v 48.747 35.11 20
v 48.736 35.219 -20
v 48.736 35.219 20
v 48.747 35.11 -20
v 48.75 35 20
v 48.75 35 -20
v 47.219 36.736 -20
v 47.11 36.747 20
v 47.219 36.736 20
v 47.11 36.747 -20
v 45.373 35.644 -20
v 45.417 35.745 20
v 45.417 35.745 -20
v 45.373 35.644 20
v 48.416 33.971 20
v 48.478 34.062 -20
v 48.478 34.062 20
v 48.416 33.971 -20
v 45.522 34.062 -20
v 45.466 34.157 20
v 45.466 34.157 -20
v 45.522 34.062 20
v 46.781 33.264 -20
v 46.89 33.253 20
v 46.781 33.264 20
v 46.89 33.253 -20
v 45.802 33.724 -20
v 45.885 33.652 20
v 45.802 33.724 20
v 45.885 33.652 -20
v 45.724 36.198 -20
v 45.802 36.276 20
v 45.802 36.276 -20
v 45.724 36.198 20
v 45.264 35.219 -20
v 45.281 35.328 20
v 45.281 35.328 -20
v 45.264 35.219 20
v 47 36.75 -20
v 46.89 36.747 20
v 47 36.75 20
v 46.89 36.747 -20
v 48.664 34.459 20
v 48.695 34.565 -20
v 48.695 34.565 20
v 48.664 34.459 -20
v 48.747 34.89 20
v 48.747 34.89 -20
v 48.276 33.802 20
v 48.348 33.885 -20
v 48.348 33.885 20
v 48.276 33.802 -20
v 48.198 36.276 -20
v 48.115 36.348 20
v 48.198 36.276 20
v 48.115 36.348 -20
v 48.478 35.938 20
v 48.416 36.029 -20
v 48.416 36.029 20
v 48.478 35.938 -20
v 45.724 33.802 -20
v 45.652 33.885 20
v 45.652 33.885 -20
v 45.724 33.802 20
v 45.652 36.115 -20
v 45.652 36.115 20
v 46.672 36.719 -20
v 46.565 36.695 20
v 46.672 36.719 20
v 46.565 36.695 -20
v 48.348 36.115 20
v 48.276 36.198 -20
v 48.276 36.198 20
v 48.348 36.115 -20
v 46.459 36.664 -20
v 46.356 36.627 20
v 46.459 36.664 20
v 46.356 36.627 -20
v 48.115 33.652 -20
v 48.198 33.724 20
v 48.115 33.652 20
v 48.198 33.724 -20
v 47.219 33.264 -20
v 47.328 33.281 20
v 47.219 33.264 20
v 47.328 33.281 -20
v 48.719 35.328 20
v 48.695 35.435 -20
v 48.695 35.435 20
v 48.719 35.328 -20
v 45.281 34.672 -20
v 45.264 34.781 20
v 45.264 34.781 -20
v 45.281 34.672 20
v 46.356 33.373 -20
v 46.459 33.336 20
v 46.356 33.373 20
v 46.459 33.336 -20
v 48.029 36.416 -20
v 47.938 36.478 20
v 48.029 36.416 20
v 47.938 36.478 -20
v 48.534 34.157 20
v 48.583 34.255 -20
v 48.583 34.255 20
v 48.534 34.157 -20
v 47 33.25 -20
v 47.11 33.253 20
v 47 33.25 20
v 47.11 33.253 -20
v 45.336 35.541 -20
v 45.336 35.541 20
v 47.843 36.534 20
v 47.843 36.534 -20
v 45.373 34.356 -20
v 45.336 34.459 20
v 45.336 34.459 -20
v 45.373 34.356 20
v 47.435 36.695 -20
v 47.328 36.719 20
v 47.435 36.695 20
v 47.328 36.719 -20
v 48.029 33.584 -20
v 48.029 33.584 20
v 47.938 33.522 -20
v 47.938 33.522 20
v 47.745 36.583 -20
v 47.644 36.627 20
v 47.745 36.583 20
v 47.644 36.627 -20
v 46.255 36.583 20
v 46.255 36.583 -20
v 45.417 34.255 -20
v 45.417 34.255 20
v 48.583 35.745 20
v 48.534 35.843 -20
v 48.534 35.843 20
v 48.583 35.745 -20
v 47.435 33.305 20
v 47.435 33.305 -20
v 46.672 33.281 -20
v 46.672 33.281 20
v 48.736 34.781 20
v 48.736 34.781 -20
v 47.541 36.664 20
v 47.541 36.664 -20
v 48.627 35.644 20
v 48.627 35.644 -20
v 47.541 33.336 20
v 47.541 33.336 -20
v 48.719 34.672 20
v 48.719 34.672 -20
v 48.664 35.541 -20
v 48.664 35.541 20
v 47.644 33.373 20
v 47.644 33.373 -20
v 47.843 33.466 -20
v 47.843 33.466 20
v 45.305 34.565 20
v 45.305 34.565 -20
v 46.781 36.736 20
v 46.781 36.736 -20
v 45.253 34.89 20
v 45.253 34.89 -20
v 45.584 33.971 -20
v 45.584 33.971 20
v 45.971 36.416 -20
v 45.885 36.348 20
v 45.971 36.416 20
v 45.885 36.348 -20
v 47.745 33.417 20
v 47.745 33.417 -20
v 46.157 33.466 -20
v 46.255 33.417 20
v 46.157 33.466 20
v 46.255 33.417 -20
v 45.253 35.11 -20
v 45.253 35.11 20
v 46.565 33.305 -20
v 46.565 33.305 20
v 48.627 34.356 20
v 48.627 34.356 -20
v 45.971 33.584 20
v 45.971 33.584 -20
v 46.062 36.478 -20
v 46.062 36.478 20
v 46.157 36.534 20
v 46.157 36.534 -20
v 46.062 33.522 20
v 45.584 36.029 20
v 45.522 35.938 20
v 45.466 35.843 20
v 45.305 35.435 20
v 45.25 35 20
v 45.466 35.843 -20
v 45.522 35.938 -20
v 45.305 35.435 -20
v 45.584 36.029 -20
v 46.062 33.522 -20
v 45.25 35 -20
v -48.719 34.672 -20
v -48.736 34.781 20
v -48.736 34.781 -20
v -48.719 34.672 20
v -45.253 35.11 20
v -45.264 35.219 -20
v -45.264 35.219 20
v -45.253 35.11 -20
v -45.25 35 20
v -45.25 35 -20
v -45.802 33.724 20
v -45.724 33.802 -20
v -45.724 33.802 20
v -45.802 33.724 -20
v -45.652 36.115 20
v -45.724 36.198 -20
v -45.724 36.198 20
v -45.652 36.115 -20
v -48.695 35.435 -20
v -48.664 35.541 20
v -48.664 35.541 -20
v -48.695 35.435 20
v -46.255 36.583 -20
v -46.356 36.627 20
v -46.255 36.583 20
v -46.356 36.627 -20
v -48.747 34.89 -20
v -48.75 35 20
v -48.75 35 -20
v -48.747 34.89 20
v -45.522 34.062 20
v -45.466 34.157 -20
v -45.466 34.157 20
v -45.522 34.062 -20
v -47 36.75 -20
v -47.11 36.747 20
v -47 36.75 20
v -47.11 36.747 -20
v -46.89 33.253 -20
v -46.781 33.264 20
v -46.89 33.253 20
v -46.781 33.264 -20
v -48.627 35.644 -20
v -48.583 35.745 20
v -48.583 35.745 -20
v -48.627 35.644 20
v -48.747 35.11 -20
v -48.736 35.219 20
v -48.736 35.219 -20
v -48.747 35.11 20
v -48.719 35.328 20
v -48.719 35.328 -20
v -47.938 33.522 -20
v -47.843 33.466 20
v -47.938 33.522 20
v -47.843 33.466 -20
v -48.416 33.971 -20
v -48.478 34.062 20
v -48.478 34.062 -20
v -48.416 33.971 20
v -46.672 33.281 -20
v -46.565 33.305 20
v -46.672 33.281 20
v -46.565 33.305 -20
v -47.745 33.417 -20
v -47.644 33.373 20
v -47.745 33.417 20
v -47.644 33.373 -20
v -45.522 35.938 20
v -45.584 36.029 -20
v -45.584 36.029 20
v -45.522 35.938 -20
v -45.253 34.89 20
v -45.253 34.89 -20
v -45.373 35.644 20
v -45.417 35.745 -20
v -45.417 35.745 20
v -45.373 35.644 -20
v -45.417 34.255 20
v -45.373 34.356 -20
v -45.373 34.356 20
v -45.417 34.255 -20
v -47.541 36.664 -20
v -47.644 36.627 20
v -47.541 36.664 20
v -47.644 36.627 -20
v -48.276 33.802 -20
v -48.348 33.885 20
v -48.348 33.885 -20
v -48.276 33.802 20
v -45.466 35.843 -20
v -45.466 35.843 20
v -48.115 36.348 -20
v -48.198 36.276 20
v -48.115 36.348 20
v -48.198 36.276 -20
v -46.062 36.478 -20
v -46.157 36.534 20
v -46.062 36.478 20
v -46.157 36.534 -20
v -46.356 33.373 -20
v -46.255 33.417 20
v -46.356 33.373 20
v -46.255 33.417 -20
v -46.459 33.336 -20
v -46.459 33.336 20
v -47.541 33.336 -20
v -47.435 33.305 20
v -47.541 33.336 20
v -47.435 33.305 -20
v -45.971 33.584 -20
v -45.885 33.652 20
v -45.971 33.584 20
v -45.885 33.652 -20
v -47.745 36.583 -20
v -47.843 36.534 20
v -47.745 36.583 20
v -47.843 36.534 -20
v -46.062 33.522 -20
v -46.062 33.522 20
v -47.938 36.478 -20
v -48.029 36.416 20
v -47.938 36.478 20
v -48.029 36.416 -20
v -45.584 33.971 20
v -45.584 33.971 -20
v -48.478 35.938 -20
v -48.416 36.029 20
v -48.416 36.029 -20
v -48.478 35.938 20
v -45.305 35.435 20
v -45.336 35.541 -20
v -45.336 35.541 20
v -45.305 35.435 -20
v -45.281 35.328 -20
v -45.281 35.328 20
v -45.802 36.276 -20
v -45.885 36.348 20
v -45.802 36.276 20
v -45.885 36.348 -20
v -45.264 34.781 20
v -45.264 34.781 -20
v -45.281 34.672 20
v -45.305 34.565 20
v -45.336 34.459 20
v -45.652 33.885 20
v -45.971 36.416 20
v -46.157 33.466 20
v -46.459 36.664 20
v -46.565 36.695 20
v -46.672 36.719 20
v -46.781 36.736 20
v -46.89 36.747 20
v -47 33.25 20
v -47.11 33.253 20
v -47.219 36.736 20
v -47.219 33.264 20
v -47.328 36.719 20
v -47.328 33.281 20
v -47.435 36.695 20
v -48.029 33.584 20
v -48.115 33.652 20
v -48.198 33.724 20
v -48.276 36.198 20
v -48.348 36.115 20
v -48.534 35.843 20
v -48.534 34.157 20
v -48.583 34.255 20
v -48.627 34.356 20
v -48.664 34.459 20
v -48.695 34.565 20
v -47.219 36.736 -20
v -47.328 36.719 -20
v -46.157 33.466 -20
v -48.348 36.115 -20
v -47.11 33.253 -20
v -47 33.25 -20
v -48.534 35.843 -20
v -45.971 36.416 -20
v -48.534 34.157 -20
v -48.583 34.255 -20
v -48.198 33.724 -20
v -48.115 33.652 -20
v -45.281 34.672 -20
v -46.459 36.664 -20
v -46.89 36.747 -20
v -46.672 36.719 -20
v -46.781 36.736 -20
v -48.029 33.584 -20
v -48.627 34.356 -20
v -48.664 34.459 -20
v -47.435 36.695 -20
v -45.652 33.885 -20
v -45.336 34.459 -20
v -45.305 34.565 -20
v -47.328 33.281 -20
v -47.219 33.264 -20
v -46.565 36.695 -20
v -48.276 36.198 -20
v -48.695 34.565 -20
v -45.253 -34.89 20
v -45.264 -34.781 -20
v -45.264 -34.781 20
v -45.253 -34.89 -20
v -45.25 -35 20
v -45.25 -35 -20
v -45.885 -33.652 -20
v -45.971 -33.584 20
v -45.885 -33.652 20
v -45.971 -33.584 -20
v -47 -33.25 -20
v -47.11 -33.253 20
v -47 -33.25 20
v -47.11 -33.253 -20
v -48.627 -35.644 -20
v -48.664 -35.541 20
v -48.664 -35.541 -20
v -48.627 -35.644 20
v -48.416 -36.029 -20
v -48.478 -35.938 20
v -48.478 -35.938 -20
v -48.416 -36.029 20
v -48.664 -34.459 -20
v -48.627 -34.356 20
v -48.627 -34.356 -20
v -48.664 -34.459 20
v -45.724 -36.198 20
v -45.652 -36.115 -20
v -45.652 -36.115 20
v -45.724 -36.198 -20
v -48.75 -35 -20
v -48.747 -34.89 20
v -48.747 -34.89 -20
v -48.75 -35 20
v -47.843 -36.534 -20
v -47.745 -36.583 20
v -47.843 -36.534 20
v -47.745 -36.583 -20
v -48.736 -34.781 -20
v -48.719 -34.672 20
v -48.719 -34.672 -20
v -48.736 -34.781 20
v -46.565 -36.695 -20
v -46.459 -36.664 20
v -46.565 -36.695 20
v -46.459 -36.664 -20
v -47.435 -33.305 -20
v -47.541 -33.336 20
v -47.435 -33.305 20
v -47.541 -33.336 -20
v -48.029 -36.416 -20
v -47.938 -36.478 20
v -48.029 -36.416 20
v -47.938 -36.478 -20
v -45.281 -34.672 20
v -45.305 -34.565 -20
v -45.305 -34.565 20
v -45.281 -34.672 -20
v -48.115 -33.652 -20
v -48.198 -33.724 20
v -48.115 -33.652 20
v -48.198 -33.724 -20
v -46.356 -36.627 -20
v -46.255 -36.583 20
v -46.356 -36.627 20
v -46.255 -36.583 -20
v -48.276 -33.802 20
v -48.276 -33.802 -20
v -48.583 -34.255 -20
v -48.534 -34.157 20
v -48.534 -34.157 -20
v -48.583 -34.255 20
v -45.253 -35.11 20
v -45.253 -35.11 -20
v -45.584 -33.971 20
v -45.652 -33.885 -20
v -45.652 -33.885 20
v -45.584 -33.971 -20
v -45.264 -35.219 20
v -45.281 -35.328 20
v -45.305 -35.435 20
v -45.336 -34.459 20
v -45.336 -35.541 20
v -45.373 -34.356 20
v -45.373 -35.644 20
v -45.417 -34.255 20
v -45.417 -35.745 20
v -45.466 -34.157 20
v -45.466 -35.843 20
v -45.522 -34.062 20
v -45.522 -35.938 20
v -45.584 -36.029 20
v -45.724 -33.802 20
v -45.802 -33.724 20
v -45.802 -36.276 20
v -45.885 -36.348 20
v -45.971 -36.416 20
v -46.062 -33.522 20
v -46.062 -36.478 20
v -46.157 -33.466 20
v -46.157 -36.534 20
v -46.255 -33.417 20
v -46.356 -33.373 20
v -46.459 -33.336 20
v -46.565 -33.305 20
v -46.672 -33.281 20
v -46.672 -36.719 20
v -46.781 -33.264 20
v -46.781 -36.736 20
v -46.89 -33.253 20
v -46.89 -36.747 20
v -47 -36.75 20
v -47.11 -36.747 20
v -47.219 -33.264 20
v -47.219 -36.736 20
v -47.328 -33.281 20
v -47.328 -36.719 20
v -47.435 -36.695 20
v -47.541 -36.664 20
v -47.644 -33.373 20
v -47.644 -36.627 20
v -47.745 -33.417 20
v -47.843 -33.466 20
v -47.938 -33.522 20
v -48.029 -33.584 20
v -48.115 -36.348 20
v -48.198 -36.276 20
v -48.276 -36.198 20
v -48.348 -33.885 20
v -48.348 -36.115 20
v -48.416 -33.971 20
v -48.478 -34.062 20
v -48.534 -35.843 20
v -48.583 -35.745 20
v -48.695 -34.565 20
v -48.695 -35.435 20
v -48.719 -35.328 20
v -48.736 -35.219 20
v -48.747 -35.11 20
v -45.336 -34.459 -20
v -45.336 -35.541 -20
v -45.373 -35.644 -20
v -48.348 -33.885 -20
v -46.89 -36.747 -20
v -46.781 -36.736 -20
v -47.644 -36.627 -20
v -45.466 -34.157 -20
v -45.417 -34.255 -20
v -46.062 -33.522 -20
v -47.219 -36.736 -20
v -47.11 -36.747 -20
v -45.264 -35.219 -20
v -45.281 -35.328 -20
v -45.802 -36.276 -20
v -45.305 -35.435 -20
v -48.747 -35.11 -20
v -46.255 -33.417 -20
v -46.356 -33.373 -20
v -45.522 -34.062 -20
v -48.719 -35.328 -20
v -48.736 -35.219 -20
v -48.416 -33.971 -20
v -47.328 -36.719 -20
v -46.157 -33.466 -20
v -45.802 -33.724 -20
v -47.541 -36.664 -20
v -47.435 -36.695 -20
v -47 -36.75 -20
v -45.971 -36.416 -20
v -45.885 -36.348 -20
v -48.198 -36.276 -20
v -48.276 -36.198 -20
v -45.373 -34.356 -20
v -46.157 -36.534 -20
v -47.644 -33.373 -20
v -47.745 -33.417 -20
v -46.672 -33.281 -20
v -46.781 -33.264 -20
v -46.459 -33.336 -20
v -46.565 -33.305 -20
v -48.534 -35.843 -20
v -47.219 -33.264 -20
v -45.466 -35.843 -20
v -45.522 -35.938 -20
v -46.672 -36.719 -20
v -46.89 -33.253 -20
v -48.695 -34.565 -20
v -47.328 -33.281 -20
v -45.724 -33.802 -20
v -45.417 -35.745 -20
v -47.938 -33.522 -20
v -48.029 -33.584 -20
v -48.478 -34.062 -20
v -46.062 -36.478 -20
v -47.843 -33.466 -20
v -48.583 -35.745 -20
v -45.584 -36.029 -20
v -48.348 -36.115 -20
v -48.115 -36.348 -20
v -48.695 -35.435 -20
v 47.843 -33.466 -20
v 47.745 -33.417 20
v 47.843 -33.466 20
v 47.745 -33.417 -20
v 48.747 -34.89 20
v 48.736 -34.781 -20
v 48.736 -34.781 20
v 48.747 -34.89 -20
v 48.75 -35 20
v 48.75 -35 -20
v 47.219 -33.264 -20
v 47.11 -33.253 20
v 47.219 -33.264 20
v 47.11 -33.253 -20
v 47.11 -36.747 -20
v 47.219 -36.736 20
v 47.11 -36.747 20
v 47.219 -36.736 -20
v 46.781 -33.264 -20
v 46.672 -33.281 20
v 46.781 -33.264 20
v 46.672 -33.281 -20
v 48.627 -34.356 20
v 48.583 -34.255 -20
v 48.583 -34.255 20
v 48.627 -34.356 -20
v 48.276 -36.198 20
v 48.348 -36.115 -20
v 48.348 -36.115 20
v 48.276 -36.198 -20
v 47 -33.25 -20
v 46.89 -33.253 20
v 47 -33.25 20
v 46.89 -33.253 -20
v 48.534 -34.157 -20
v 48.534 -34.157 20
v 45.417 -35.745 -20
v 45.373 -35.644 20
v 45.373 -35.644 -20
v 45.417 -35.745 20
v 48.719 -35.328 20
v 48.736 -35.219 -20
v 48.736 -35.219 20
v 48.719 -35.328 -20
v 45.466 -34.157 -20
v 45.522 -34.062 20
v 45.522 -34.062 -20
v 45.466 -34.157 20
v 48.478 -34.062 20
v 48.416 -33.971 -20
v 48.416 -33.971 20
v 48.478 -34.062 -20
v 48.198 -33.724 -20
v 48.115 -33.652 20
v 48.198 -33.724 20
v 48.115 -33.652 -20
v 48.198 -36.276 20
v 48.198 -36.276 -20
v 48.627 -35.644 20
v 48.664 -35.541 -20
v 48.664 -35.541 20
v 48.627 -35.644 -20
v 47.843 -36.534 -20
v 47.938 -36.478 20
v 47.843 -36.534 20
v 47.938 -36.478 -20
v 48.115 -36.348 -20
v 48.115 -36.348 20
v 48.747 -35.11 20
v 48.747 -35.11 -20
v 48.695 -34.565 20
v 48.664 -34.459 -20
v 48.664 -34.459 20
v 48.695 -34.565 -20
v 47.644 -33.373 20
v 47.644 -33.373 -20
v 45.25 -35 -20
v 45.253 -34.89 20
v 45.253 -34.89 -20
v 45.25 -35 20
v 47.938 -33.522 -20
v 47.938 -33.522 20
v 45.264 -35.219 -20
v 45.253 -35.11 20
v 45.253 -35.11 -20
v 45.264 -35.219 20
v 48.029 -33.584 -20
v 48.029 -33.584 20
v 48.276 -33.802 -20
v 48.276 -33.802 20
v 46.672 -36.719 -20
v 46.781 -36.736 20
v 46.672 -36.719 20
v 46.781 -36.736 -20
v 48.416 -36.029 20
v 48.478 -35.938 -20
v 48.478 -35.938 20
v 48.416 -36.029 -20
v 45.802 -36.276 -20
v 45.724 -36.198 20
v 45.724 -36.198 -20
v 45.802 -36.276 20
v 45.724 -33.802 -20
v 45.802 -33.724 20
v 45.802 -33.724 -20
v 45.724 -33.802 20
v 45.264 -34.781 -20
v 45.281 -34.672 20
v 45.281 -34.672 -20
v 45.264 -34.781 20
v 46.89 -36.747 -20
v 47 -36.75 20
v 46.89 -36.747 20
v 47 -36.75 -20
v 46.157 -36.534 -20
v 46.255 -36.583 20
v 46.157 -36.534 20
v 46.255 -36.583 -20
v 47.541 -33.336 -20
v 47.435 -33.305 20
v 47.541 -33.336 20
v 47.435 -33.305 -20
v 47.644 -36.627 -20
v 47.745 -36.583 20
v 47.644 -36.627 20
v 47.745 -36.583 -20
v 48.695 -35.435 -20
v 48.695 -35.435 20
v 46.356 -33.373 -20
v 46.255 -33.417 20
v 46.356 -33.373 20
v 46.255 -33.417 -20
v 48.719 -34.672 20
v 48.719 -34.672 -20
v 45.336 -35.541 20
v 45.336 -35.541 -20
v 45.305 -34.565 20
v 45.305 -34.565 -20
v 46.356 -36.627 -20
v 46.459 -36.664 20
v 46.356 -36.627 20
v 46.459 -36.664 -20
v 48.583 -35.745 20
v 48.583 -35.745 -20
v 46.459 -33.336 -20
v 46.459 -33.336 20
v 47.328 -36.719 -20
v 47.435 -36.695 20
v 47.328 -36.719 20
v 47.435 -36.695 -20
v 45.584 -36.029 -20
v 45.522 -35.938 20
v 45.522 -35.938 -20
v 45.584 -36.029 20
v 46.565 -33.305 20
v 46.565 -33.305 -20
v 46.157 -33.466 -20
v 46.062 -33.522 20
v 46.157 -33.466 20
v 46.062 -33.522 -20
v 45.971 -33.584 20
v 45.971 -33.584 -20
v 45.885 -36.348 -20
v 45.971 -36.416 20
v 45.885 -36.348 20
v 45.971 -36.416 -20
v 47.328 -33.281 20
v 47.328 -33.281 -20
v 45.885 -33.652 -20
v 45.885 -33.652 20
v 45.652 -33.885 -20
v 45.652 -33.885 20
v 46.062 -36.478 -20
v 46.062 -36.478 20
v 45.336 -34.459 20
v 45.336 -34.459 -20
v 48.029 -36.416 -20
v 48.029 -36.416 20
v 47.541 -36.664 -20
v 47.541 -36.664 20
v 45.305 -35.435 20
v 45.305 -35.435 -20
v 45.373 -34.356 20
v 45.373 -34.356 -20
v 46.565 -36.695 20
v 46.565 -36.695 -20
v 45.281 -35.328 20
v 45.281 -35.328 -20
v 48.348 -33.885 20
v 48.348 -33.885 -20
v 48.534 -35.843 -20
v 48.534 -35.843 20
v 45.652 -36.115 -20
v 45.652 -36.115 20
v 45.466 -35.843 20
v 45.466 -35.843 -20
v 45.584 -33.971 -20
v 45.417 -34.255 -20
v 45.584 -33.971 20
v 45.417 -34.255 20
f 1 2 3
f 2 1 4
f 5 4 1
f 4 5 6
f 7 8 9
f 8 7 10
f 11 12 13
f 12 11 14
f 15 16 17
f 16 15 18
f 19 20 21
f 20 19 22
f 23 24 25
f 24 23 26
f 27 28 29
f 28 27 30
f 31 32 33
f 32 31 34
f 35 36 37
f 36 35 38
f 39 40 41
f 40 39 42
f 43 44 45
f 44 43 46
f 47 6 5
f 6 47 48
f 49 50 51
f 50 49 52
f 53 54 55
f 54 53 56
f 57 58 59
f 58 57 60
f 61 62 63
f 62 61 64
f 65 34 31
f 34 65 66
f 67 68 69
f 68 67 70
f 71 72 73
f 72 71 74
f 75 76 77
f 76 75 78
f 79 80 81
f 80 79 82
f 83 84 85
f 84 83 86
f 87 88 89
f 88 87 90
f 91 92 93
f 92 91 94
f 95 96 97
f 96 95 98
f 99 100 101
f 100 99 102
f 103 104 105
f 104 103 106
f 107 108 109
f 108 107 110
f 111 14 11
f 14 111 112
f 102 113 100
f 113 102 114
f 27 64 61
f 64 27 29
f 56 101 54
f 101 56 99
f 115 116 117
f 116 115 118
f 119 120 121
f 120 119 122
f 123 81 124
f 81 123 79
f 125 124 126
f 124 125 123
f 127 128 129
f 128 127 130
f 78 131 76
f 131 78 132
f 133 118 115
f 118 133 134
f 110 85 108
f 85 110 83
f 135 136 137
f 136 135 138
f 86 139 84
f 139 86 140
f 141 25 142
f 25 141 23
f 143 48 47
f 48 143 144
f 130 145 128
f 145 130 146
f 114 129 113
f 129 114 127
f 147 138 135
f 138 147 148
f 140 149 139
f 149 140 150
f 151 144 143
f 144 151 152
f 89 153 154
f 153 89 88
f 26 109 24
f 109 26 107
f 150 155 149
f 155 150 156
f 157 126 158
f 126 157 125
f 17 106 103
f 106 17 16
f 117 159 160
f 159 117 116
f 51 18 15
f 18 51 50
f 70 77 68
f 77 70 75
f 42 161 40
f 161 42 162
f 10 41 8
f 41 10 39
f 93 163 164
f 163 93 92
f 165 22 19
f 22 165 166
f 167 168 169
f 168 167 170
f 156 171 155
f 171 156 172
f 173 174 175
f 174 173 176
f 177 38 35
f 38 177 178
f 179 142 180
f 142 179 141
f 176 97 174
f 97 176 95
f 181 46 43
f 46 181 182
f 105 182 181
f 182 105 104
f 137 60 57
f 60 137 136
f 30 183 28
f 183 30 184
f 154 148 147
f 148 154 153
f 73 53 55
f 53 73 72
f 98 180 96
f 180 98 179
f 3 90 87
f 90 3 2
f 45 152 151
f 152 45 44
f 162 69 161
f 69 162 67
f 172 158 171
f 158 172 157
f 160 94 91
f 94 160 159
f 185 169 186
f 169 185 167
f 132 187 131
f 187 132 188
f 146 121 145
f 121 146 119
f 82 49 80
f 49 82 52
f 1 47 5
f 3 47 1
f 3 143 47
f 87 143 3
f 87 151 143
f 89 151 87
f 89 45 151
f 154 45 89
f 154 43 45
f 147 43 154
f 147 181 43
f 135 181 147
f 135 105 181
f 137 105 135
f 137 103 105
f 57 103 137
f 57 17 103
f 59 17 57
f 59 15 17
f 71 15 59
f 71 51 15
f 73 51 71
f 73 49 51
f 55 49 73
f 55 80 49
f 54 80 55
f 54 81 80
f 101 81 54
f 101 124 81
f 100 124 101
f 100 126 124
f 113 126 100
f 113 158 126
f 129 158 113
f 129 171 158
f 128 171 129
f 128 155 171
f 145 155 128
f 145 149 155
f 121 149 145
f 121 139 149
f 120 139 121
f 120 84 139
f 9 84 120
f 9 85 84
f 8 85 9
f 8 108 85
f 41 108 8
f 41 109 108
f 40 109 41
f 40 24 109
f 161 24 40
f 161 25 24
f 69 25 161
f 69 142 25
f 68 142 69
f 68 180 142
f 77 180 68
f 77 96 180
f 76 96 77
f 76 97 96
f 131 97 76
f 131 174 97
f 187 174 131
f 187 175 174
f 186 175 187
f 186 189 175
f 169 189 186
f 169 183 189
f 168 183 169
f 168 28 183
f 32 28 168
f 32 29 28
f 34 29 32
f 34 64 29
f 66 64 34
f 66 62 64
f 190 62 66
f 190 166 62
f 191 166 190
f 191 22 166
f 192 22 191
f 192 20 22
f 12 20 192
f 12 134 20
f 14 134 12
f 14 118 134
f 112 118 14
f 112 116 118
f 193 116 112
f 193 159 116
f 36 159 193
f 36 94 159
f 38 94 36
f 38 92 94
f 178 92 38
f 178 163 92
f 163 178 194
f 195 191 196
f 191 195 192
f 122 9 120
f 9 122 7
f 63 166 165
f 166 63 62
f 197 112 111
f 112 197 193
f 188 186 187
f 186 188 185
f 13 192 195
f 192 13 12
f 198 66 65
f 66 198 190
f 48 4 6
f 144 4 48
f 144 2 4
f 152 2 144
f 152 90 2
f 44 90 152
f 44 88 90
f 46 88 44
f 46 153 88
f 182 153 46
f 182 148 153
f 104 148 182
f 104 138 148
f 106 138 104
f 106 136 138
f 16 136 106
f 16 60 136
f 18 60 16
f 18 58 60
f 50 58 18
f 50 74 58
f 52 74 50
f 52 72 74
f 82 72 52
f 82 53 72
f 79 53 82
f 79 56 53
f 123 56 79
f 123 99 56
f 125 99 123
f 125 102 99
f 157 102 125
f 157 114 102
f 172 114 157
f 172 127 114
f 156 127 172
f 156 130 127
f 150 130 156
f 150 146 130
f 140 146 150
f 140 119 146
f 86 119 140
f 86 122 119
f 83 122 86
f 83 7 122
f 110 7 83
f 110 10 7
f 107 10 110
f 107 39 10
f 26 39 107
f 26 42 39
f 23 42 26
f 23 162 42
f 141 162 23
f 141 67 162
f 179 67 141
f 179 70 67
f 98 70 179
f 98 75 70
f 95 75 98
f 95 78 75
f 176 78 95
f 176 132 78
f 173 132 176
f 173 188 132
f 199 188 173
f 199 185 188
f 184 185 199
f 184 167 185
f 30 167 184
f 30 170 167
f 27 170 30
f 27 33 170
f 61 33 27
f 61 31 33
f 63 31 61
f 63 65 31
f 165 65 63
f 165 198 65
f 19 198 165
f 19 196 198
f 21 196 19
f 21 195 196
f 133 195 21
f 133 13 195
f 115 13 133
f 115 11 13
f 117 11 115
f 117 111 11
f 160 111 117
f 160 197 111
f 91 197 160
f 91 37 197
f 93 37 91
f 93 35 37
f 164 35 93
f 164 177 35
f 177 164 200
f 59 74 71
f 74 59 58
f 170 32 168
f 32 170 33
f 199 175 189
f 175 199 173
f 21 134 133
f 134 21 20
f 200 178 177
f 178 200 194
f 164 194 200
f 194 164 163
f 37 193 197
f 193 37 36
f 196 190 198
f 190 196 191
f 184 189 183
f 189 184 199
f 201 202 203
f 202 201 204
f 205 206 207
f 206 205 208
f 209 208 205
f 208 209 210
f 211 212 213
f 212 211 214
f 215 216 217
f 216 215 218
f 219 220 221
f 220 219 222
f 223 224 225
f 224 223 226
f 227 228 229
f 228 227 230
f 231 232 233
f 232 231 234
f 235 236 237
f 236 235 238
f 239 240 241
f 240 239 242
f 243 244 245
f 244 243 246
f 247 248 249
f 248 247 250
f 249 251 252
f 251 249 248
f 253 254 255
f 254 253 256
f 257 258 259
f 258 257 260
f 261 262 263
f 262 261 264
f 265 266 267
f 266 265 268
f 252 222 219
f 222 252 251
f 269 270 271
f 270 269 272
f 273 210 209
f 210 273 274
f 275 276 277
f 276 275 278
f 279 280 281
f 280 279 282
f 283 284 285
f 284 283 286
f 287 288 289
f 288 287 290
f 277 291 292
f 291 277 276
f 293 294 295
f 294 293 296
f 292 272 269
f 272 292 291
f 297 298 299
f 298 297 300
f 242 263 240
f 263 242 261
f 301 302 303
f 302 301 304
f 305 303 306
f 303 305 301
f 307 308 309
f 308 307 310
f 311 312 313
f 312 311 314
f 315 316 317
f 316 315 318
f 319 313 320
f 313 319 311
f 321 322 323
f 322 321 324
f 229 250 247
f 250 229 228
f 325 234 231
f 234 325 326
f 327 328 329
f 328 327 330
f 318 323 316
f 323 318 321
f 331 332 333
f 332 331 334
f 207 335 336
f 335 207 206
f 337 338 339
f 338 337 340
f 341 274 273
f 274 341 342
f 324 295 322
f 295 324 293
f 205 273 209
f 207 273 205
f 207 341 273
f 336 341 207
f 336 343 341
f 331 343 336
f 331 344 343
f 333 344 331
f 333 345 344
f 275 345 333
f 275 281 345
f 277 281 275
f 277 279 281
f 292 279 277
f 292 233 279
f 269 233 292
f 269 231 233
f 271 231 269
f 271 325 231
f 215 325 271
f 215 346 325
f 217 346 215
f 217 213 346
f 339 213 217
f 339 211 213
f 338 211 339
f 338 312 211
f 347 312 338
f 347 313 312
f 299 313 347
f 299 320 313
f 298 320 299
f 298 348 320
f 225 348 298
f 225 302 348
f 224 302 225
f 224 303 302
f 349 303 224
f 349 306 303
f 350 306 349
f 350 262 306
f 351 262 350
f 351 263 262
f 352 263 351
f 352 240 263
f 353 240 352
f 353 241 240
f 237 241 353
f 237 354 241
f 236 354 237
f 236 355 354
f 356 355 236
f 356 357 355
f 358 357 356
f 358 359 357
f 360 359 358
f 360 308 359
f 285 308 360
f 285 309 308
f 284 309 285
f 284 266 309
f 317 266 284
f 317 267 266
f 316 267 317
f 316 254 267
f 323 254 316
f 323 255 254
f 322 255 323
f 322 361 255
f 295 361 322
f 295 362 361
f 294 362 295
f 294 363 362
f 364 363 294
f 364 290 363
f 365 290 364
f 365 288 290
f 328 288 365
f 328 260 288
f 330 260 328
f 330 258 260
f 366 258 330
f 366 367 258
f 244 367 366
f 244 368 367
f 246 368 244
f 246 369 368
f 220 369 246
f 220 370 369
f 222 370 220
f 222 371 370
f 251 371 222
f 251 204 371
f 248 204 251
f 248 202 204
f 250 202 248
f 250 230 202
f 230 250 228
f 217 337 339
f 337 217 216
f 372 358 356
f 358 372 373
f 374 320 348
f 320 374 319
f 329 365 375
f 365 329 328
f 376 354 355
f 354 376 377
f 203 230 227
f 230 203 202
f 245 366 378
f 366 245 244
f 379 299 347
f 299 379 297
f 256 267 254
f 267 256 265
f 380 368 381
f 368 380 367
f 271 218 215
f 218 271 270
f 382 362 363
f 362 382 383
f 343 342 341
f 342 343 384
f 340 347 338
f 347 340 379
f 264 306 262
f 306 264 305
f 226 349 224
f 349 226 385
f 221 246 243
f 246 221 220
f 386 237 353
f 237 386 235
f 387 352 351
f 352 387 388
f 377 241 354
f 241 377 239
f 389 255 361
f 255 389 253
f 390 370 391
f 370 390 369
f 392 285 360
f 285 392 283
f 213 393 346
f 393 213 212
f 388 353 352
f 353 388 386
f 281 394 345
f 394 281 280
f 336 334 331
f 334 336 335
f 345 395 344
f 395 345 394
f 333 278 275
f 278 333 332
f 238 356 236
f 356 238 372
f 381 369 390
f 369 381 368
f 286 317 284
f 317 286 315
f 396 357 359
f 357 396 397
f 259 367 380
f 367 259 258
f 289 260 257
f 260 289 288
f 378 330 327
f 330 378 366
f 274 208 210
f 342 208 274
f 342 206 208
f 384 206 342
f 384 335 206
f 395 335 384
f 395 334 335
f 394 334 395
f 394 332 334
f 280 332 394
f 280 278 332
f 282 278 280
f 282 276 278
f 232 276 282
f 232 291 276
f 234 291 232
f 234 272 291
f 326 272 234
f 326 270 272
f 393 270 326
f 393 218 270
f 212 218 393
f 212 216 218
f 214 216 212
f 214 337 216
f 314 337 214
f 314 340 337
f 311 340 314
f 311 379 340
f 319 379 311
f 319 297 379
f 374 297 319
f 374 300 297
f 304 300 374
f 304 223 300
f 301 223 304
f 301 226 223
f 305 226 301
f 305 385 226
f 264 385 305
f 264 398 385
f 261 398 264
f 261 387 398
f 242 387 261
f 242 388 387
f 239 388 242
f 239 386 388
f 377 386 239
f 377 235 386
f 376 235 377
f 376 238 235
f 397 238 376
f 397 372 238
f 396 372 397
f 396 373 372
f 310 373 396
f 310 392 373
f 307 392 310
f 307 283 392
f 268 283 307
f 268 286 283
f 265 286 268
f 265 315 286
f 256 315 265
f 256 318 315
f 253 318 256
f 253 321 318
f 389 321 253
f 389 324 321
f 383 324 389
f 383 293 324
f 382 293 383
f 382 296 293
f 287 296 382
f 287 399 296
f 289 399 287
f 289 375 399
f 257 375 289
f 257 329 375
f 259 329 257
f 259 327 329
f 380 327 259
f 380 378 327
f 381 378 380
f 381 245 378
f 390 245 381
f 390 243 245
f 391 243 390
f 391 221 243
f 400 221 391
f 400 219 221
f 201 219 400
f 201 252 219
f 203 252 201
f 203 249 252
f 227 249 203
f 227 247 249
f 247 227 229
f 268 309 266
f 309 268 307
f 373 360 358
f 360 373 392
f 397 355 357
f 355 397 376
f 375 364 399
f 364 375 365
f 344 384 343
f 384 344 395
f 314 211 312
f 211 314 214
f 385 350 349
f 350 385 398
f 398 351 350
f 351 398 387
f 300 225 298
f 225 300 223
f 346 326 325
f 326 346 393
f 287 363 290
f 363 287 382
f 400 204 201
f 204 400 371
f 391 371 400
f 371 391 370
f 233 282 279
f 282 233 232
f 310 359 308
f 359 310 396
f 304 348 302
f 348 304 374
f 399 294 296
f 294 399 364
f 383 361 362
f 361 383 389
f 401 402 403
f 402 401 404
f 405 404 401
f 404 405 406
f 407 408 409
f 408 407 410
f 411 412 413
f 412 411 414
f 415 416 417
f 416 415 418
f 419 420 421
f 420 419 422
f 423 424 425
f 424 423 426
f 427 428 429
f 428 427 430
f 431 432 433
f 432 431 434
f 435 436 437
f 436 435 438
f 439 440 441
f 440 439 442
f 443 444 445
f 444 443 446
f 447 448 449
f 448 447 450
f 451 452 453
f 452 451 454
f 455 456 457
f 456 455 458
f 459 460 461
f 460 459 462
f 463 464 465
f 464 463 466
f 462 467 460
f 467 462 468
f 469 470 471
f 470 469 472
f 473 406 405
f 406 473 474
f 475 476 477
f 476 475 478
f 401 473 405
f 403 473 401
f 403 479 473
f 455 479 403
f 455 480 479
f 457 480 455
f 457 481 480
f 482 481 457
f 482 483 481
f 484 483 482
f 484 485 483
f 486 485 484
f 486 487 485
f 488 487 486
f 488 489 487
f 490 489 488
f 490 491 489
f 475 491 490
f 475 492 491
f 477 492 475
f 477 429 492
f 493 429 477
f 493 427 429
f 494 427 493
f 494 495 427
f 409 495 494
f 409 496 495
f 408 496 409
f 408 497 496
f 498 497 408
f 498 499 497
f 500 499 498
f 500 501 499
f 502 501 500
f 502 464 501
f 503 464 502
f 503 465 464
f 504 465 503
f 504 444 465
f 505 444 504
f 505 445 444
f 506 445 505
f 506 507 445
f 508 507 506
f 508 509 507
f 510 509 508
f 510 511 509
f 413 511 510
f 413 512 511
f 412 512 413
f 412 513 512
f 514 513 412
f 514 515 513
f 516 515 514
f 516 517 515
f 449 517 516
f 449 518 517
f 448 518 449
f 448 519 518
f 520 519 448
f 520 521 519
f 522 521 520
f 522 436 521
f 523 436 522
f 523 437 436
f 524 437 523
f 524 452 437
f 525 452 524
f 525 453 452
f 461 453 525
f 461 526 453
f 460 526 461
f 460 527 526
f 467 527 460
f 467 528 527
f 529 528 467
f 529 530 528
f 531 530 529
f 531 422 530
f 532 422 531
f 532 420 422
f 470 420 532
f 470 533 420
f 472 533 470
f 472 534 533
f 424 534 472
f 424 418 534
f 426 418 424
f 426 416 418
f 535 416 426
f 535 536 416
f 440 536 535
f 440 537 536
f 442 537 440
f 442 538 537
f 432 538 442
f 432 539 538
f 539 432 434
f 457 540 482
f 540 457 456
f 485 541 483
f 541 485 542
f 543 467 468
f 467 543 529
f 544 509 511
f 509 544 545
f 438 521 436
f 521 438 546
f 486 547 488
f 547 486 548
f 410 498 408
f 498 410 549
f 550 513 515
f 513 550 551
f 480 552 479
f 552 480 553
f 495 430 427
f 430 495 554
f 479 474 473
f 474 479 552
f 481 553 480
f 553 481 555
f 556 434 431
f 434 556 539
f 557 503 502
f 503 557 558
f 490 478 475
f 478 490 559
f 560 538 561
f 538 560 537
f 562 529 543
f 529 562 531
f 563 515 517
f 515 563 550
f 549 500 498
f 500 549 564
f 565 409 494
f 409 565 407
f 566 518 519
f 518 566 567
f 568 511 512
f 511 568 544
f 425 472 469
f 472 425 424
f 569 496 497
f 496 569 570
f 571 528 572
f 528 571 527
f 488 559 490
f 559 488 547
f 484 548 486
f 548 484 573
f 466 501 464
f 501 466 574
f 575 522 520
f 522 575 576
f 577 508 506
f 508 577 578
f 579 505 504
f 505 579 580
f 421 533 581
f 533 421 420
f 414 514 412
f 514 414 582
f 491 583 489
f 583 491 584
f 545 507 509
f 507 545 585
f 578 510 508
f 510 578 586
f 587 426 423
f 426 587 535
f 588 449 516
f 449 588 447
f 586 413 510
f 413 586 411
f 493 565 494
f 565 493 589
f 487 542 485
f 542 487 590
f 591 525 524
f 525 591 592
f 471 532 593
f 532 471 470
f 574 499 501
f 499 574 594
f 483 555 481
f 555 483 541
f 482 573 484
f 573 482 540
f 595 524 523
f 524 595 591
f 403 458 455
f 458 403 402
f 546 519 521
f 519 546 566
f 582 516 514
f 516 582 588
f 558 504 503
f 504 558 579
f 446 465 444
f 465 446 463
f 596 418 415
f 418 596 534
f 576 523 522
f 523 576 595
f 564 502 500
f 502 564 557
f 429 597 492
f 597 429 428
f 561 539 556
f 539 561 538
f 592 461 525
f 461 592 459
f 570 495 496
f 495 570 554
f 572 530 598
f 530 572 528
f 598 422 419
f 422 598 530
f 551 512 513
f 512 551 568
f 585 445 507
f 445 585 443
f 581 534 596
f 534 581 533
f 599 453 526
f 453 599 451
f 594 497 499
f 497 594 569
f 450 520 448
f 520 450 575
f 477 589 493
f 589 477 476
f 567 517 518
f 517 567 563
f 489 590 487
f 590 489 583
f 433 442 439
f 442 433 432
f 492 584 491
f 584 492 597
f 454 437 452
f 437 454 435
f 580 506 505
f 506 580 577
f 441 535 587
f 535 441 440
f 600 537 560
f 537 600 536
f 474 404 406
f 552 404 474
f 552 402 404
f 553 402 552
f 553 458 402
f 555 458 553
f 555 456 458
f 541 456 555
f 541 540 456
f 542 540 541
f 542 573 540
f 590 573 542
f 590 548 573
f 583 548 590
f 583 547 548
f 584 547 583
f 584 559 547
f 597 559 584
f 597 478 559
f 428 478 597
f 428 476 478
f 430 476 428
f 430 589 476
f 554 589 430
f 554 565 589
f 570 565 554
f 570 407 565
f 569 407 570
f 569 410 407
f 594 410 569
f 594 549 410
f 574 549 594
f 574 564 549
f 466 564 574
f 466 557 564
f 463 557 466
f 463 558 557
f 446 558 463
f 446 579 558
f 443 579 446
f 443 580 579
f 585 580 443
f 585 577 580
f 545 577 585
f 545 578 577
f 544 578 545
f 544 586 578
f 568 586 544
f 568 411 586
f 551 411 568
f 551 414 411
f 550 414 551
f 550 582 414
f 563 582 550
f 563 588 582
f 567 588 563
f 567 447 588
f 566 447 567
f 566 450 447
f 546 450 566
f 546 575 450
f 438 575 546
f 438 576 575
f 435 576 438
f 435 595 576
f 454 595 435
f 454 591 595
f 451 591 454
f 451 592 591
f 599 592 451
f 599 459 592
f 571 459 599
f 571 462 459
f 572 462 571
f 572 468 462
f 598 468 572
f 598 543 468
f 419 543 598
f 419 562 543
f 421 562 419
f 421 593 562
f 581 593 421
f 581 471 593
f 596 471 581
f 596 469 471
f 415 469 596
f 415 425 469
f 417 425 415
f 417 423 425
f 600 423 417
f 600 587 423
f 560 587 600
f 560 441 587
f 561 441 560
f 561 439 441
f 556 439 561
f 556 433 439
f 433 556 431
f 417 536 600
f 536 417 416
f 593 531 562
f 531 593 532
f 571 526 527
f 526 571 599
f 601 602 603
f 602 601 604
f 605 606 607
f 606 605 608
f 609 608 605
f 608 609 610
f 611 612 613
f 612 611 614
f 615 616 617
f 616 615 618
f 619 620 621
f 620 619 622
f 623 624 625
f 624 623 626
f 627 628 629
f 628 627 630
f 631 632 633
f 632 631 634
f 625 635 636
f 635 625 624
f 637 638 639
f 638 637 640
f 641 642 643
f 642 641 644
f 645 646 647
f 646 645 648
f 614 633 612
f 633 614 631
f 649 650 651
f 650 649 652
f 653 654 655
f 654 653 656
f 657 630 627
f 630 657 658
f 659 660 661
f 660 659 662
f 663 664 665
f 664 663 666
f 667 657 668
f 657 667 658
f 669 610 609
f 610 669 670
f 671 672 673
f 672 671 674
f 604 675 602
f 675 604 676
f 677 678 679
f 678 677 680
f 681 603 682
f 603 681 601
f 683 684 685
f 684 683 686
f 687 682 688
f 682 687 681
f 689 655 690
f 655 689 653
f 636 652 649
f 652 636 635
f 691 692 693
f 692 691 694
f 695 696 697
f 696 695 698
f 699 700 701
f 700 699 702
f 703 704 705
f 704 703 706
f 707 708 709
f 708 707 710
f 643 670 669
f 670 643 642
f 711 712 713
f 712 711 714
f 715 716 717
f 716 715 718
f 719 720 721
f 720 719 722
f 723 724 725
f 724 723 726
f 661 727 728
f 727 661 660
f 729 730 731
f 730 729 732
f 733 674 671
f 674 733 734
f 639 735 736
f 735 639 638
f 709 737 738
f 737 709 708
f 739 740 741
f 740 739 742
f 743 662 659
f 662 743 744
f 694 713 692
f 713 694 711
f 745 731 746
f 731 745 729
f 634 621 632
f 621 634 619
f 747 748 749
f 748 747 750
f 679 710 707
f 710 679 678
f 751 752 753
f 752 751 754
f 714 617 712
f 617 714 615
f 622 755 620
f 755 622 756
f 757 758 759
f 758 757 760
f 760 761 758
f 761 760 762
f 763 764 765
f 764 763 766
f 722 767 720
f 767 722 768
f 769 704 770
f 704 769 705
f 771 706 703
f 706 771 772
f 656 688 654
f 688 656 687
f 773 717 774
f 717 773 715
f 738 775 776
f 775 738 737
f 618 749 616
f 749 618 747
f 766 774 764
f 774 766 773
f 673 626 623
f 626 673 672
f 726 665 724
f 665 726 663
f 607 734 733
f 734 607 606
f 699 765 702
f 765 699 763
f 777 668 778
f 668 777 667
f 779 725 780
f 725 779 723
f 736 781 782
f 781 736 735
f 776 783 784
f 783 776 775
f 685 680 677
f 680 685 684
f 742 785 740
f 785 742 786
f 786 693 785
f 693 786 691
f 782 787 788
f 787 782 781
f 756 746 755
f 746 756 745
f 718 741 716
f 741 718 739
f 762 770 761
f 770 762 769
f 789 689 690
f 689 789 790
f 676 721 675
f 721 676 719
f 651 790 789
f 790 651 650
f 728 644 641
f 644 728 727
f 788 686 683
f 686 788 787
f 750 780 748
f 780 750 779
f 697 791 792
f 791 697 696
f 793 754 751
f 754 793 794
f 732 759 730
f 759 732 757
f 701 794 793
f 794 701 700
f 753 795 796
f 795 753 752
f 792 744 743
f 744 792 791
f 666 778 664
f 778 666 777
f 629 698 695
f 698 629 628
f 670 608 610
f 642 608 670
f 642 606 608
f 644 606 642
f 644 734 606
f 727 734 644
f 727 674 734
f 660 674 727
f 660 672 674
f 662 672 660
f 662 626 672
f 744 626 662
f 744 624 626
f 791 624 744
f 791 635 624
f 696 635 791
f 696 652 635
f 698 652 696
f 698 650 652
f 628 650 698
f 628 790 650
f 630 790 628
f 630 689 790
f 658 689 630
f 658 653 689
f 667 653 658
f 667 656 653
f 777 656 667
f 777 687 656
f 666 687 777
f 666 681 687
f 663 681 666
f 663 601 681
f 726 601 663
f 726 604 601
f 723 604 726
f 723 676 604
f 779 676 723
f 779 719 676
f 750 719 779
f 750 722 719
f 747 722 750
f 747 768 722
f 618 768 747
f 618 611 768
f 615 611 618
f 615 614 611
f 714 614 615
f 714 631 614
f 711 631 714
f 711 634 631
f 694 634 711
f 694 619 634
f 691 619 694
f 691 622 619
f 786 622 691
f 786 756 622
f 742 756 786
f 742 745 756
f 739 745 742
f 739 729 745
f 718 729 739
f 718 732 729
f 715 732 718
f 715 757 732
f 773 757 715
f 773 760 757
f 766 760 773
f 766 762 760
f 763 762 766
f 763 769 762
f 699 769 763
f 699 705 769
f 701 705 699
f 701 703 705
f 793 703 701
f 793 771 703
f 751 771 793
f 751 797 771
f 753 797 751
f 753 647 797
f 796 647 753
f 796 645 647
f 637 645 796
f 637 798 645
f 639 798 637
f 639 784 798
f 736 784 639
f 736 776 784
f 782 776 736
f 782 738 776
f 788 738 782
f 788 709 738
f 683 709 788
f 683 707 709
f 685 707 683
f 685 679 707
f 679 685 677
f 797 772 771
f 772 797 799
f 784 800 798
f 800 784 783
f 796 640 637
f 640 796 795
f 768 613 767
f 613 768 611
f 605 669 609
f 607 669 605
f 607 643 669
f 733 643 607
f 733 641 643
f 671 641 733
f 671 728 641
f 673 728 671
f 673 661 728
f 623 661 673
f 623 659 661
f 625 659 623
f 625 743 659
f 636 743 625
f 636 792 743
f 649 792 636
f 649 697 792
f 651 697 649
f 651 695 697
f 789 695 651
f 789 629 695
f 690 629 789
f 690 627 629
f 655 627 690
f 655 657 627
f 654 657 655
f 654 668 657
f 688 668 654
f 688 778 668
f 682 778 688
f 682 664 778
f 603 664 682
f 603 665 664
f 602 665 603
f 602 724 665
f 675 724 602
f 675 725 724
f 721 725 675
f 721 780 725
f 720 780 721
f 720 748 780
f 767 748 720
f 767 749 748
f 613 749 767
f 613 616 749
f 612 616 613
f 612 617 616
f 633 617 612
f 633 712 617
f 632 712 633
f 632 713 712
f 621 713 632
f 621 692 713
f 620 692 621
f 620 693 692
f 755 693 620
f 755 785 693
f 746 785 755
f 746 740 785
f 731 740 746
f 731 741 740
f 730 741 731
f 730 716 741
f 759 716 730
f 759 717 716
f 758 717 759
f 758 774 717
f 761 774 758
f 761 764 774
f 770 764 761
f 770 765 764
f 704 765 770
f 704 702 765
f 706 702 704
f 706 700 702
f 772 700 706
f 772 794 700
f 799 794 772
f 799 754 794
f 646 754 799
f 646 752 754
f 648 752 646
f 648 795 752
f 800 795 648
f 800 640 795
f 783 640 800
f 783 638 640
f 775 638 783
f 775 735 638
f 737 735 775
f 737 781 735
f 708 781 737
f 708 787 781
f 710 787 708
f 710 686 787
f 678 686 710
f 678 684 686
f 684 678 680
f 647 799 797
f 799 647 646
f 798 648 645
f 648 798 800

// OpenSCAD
floppyFixationThrows();

module floppyFixationThrows(
    _fn = 100,
    z_size = 40,
    throws_diameter = 3.5
) {

    x_gap = 94;
    y_gap = 70;

    translate([
        x_gap / 2,
        y_gap / 2,
        0
    ])
        cylinder(d=throws_diameter, h=z_size, center=true, $fn=_fn);

    translate([
        -x_gap / 2,
        y_gap / 2,
        0
    ])
        cylinder(d=throws_diameter, h=z_size, center=true, $fn=_fn);

    translate([
        -x_gap / 2,
        -y_gap / 2,
        0
    ])
        cylinder(d=throws_diameter, h=z_size, center=true, $fn=_fn);

    translate([
        x_gap / 2,
        -y_gap / 2,
        0
    ])
        cylinder(d=throws_diameter, h=z_size, center=true, $fn=_fn);


}
